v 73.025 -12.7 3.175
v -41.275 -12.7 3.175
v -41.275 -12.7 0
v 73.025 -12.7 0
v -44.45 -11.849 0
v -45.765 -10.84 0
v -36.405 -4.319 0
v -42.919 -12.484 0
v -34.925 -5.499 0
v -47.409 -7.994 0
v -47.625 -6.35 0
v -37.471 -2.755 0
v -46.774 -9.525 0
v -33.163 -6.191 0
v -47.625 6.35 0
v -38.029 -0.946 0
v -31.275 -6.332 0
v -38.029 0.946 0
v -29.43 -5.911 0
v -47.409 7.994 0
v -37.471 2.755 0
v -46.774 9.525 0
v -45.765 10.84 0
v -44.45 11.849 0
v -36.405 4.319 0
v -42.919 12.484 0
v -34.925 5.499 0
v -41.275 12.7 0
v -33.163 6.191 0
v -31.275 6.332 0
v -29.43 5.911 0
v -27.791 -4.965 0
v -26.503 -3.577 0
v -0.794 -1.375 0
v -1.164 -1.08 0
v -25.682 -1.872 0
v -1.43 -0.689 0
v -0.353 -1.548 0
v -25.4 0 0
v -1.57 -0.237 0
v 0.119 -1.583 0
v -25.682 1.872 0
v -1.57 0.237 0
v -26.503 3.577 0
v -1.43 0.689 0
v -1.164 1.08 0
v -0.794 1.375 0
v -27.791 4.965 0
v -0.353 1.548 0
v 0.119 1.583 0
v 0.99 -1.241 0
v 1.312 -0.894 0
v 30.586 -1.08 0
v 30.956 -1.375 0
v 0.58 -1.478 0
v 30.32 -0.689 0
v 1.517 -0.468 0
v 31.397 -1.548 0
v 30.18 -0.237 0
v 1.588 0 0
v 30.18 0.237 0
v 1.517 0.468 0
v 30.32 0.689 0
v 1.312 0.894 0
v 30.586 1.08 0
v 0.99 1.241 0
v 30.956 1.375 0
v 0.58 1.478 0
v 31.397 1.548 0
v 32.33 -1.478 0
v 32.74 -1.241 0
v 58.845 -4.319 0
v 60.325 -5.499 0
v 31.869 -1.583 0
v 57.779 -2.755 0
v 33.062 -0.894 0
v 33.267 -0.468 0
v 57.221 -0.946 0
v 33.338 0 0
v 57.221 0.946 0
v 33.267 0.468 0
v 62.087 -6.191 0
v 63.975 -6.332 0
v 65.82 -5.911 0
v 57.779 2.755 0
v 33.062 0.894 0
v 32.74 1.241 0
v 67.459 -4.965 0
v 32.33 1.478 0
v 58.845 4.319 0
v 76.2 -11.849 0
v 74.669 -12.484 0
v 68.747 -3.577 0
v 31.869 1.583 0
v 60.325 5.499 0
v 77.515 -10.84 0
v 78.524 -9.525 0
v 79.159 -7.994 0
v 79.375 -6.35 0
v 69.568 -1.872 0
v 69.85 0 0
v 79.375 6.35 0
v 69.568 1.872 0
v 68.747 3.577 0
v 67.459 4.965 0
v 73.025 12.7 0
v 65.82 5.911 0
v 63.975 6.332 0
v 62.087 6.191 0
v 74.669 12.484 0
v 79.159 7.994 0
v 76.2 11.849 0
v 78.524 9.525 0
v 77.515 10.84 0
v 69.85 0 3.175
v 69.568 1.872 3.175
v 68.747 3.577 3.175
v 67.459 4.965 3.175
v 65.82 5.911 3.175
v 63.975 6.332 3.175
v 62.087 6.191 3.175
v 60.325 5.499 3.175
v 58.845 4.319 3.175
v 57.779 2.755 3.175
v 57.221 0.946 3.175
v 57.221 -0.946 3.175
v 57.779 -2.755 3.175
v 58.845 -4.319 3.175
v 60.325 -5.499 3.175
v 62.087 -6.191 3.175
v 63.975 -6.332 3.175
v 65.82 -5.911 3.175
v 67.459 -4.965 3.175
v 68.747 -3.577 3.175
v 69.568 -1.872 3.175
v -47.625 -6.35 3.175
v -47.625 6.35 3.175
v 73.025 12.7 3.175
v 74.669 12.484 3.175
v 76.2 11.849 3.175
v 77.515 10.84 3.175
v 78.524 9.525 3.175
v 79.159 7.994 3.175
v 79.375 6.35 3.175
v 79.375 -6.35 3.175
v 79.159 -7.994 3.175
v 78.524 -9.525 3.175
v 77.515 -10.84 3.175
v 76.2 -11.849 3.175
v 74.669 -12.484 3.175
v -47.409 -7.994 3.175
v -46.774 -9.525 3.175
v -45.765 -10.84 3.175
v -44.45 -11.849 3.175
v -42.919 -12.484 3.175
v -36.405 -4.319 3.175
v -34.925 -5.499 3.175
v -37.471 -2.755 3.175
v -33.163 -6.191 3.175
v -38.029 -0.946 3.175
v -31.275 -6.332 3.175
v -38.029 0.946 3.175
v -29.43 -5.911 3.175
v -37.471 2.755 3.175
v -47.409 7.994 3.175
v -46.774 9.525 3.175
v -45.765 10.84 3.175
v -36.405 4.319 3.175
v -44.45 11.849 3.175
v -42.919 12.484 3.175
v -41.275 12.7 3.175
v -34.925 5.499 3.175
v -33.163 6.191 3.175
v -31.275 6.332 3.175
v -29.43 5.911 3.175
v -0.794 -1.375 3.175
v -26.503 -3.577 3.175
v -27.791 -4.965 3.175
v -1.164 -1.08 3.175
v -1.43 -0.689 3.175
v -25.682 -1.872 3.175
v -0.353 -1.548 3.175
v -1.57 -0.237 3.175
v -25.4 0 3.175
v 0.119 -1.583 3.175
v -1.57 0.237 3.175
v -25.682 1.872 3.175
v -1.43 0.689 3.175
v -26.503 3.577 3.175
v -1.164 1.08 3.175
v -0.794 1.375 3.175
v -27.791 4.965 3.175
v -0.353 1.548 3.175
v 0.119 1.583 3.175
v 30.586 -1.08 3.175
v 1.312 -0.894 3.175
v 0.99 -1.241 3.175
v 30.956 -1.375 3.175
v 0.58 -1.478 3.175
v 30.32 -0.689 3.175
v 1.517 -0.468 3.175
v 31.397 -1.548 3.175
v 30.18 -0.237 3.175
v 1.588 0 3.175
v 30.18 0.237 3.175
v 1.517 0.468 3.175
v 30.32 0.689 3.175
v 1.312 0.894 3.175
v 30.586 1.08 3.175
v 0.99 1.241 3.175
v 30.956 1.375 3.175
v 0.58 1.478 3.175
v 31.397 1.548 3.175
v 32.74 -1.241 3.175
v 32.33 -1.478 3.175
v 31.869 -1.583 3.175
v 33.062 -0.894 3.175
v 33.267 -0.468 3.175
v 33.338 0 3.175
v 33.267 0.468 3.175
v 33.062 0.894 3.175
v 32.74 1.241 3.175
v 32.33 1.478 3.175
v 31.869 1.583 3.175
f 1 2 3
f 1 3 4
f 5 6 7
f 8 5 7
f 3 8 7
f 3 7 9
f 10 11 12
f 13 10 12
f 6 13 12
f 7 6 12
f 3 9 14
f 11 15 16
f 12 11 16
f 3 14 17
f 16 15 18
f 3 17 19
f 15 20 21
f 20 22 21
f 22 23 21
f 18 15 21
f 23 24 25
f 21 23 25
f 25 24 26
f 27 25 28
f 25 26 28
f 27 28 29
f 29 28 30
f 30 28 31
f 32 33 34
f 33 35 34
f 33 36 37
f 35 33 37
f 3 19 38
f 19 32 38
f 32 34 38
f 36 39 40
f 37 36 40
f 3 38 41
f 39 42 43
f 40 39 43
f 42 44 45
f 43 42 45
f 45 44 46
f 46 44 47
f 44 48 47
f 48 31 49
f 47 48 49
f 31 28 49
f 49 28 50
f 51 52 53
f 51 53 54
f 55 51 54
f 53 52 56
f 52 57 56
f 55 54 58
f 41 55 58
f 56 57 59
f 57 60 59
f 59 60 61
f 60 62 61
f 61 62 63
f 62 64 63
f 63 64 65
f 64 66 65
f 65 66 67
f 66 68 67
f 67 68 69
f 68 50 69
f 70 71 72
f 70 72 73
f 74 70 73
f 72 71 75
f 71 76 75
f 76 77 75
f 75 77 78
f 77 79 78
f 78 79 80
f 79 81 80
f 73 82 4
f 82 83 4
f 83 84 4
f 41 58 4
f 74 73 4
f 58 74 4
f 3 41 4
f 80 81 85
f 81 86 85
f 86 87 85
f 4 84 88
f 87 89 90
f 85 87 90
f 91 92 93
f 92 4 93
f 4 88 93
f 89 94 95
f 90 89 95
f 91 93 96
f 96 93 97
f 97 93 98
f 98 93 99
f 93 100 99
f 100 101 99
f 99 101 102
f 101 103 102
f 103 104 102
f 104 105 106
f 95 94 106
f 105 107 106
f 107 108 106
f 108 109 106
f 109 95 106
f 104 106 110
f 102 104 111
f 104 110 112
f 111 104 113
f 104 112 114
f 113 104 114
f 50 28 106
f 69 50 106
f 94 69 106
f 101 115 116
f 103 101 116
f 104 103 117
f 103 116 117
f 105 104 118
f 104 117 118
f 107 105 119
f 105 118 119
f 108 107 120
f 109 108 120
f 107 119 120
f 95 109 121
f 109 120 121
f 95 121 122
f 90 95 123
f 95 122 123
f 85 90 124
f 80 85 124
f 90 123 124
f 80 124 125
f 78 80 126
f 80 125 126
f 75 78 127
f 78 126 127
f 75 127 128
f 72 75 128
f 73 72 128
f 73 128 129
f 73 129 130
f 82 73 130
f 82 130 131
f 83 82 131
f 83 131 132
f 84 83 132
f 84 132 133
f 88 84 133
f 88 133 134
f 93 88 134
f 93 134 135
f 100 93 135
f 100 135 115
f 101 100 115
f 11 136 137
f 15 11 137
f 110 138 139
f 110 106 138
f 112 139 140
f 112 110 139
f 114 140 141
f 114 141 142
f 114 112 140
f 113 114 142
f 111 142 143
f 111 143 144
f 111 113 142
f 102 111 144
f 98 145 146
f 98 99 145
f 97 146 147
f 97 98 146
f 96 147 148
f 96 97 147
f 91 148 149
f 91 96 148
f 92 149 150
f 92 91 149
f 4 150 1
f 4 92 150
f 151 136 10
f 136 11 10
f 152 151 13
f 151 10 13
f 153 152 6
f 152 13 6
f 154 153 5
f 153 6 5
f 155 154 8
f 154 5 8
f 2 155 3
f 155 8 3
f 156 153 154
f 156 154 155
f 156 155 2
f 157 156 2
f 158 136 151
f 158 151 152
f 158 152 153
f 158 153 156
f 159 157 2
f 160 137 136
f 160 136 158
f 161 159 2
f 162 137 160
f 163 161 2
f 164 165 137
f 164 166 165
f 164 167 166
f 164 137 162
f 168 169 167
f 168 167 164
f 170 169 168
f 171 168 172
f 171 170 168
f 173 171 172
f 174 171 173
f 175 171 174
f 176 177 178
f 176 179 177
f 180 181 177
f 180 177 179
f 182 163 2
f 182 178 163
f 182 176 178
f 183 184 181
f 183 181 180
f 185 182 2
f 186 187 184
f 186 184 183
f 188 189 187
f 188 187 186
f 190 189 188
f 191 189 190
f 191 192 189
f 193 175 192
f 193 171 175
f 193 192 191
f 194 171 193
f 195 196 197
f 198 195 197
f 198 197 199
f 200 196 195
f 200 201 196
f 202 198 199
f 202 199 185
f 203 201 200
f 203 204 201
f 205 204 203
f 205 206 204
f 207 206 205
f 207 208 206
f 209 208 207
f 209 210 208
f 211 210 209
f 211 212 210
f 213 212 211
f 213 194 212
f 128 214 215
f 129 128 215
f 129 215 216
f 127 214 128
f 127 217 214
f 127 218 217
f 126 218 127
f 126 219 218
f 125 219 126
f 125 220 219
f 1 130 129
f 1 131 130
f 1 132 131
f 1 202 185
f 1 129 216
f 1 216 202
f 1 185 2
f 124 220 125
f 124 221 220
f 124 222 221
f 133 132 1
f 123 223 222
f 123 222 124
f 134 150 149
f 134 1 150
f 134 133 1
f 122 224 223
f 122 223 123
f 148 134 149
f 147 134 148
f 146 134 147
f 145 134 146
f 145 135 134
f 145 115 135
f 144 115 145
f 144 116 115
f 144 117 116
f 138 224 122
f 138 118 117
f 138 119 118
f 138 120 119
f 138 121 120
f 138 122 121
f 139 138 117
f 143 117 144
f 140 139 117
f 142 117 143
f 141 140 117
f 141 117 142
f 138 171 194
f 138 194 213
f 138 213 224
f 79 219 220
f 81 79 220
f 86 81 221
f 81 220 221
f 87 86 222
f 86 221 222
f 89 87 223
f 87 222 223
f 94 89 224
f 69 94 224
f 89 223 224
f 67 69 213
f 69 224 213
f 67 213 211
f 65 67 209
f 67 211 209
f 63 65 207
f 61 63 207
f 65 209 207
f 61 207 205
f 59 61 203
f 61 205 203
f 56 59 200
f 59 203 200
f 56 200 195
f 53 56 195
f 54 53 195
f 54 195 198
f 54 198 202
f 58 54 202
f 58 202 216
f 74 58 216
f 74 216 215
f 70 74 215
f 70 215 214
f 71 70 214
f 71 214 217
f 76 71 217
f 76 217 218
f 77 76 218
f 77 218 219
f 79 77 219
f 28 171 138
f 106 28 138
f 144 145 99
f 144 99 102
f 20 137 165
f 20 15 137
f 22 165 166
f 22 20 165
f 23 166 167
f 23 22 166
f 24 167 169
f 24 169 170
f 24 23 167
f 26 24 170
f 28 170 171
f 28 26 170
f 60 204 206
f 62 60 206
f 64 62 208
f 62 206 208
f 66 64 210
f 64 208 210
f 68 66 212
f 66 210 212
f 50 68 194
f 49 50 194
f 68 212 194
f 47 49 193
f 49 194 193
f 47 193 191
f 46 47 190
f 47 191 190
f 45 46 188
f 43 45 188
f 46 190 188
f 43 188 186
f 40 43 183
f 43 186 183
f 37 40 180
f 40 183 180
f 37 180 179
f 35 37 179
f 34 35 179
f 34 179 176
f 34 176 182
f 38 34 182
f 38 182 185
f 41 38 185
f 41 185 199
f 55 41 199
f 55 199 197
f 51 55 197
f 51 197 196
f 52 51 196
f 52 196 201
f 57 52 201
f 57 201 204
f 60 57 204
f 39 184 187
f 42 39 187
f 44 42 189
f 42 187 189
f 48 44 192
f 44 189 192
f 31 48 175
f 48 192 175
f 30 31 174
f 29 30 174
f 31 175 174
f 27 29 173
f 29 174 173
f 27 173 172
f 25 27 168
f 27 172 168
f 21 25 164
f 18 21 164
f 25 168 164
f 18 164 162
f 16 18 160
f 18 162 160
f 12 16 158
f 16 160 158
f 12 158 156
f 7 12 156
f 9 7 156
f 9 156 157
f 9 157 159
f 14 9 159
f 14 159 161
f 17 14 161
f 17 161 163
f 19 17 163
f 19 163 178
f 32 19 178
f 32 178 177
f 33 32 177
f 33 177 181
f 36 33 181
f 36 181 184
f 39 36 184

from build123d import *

# Parameters (mm, degrees)
F0_W     = 203.2
F0_H     = 152.4
F1_DEPTH = 3.175
F2_R     = 6.35
F3_DEPTH = 3.176
F4_W     = 203.2
F4_H     = 152.4
F4_W_2   = 127
F4_H_2   = 25.4
F5_DEPTH = 3.176
F6_R     = 6.35
F7_R     = 1.5875
F8_DEPTH = 3.176


with BuildPart() as f1:
    # F0 (on Top) → F1 (new body)
    with BuildSketch(Plane.XY):
        Rectangle(F0_W, F0_H)
    extrude(amount=F1_DEPTH)

    # F2 (on face) → F3 (cut, through all)
    with BuildSketch(Plane.XY.offset(3.175)):
        with Locations((-31.75, 0)):
            Circle(F2_R)
        with Locations((63.5, 0)):
            Circle(F2_R)
    extrude(amount=-F3_DEPTH, mode=Mode.SUBTRACT)

    # F4 (on face) → F5 (cut, through all)
    with BuildSketch(Plane.XY.offset(3.175)):
        Rectangle(F4_W, F4_H)
        with Locations((15.875, 0)):
            Rectangle(F4_W_2, F4_H_2, mode=Mode.SUBTRACT)
    extrude(amount=-F5_DEPTH, mode=Mode.SUBTRACT)

    # F6
    f6_edges = [f1.edges().sort_by_distance(p)[0] for p in [
        (-47.625, 12.7, 1.5875),
        (-47.625, -12.7, 1.5875),
        (79.375, -12.7, 1.5875),
        (79.375, 12.7, 1.5875),
    ]]
    fillet(f6_edges, radius=F6_R)

    # F7 (on face) → F8 (cut, through all)
    with BuildSketch(Plane.XY.offset(3.175)):
        Circle(F7_R)
        with Locations((31.75, 0)):
            Circle(F7_R)
    extrude(amount=-F8_DEPTH, mode=Mode.SUBTRACT)


solid = f1.part
